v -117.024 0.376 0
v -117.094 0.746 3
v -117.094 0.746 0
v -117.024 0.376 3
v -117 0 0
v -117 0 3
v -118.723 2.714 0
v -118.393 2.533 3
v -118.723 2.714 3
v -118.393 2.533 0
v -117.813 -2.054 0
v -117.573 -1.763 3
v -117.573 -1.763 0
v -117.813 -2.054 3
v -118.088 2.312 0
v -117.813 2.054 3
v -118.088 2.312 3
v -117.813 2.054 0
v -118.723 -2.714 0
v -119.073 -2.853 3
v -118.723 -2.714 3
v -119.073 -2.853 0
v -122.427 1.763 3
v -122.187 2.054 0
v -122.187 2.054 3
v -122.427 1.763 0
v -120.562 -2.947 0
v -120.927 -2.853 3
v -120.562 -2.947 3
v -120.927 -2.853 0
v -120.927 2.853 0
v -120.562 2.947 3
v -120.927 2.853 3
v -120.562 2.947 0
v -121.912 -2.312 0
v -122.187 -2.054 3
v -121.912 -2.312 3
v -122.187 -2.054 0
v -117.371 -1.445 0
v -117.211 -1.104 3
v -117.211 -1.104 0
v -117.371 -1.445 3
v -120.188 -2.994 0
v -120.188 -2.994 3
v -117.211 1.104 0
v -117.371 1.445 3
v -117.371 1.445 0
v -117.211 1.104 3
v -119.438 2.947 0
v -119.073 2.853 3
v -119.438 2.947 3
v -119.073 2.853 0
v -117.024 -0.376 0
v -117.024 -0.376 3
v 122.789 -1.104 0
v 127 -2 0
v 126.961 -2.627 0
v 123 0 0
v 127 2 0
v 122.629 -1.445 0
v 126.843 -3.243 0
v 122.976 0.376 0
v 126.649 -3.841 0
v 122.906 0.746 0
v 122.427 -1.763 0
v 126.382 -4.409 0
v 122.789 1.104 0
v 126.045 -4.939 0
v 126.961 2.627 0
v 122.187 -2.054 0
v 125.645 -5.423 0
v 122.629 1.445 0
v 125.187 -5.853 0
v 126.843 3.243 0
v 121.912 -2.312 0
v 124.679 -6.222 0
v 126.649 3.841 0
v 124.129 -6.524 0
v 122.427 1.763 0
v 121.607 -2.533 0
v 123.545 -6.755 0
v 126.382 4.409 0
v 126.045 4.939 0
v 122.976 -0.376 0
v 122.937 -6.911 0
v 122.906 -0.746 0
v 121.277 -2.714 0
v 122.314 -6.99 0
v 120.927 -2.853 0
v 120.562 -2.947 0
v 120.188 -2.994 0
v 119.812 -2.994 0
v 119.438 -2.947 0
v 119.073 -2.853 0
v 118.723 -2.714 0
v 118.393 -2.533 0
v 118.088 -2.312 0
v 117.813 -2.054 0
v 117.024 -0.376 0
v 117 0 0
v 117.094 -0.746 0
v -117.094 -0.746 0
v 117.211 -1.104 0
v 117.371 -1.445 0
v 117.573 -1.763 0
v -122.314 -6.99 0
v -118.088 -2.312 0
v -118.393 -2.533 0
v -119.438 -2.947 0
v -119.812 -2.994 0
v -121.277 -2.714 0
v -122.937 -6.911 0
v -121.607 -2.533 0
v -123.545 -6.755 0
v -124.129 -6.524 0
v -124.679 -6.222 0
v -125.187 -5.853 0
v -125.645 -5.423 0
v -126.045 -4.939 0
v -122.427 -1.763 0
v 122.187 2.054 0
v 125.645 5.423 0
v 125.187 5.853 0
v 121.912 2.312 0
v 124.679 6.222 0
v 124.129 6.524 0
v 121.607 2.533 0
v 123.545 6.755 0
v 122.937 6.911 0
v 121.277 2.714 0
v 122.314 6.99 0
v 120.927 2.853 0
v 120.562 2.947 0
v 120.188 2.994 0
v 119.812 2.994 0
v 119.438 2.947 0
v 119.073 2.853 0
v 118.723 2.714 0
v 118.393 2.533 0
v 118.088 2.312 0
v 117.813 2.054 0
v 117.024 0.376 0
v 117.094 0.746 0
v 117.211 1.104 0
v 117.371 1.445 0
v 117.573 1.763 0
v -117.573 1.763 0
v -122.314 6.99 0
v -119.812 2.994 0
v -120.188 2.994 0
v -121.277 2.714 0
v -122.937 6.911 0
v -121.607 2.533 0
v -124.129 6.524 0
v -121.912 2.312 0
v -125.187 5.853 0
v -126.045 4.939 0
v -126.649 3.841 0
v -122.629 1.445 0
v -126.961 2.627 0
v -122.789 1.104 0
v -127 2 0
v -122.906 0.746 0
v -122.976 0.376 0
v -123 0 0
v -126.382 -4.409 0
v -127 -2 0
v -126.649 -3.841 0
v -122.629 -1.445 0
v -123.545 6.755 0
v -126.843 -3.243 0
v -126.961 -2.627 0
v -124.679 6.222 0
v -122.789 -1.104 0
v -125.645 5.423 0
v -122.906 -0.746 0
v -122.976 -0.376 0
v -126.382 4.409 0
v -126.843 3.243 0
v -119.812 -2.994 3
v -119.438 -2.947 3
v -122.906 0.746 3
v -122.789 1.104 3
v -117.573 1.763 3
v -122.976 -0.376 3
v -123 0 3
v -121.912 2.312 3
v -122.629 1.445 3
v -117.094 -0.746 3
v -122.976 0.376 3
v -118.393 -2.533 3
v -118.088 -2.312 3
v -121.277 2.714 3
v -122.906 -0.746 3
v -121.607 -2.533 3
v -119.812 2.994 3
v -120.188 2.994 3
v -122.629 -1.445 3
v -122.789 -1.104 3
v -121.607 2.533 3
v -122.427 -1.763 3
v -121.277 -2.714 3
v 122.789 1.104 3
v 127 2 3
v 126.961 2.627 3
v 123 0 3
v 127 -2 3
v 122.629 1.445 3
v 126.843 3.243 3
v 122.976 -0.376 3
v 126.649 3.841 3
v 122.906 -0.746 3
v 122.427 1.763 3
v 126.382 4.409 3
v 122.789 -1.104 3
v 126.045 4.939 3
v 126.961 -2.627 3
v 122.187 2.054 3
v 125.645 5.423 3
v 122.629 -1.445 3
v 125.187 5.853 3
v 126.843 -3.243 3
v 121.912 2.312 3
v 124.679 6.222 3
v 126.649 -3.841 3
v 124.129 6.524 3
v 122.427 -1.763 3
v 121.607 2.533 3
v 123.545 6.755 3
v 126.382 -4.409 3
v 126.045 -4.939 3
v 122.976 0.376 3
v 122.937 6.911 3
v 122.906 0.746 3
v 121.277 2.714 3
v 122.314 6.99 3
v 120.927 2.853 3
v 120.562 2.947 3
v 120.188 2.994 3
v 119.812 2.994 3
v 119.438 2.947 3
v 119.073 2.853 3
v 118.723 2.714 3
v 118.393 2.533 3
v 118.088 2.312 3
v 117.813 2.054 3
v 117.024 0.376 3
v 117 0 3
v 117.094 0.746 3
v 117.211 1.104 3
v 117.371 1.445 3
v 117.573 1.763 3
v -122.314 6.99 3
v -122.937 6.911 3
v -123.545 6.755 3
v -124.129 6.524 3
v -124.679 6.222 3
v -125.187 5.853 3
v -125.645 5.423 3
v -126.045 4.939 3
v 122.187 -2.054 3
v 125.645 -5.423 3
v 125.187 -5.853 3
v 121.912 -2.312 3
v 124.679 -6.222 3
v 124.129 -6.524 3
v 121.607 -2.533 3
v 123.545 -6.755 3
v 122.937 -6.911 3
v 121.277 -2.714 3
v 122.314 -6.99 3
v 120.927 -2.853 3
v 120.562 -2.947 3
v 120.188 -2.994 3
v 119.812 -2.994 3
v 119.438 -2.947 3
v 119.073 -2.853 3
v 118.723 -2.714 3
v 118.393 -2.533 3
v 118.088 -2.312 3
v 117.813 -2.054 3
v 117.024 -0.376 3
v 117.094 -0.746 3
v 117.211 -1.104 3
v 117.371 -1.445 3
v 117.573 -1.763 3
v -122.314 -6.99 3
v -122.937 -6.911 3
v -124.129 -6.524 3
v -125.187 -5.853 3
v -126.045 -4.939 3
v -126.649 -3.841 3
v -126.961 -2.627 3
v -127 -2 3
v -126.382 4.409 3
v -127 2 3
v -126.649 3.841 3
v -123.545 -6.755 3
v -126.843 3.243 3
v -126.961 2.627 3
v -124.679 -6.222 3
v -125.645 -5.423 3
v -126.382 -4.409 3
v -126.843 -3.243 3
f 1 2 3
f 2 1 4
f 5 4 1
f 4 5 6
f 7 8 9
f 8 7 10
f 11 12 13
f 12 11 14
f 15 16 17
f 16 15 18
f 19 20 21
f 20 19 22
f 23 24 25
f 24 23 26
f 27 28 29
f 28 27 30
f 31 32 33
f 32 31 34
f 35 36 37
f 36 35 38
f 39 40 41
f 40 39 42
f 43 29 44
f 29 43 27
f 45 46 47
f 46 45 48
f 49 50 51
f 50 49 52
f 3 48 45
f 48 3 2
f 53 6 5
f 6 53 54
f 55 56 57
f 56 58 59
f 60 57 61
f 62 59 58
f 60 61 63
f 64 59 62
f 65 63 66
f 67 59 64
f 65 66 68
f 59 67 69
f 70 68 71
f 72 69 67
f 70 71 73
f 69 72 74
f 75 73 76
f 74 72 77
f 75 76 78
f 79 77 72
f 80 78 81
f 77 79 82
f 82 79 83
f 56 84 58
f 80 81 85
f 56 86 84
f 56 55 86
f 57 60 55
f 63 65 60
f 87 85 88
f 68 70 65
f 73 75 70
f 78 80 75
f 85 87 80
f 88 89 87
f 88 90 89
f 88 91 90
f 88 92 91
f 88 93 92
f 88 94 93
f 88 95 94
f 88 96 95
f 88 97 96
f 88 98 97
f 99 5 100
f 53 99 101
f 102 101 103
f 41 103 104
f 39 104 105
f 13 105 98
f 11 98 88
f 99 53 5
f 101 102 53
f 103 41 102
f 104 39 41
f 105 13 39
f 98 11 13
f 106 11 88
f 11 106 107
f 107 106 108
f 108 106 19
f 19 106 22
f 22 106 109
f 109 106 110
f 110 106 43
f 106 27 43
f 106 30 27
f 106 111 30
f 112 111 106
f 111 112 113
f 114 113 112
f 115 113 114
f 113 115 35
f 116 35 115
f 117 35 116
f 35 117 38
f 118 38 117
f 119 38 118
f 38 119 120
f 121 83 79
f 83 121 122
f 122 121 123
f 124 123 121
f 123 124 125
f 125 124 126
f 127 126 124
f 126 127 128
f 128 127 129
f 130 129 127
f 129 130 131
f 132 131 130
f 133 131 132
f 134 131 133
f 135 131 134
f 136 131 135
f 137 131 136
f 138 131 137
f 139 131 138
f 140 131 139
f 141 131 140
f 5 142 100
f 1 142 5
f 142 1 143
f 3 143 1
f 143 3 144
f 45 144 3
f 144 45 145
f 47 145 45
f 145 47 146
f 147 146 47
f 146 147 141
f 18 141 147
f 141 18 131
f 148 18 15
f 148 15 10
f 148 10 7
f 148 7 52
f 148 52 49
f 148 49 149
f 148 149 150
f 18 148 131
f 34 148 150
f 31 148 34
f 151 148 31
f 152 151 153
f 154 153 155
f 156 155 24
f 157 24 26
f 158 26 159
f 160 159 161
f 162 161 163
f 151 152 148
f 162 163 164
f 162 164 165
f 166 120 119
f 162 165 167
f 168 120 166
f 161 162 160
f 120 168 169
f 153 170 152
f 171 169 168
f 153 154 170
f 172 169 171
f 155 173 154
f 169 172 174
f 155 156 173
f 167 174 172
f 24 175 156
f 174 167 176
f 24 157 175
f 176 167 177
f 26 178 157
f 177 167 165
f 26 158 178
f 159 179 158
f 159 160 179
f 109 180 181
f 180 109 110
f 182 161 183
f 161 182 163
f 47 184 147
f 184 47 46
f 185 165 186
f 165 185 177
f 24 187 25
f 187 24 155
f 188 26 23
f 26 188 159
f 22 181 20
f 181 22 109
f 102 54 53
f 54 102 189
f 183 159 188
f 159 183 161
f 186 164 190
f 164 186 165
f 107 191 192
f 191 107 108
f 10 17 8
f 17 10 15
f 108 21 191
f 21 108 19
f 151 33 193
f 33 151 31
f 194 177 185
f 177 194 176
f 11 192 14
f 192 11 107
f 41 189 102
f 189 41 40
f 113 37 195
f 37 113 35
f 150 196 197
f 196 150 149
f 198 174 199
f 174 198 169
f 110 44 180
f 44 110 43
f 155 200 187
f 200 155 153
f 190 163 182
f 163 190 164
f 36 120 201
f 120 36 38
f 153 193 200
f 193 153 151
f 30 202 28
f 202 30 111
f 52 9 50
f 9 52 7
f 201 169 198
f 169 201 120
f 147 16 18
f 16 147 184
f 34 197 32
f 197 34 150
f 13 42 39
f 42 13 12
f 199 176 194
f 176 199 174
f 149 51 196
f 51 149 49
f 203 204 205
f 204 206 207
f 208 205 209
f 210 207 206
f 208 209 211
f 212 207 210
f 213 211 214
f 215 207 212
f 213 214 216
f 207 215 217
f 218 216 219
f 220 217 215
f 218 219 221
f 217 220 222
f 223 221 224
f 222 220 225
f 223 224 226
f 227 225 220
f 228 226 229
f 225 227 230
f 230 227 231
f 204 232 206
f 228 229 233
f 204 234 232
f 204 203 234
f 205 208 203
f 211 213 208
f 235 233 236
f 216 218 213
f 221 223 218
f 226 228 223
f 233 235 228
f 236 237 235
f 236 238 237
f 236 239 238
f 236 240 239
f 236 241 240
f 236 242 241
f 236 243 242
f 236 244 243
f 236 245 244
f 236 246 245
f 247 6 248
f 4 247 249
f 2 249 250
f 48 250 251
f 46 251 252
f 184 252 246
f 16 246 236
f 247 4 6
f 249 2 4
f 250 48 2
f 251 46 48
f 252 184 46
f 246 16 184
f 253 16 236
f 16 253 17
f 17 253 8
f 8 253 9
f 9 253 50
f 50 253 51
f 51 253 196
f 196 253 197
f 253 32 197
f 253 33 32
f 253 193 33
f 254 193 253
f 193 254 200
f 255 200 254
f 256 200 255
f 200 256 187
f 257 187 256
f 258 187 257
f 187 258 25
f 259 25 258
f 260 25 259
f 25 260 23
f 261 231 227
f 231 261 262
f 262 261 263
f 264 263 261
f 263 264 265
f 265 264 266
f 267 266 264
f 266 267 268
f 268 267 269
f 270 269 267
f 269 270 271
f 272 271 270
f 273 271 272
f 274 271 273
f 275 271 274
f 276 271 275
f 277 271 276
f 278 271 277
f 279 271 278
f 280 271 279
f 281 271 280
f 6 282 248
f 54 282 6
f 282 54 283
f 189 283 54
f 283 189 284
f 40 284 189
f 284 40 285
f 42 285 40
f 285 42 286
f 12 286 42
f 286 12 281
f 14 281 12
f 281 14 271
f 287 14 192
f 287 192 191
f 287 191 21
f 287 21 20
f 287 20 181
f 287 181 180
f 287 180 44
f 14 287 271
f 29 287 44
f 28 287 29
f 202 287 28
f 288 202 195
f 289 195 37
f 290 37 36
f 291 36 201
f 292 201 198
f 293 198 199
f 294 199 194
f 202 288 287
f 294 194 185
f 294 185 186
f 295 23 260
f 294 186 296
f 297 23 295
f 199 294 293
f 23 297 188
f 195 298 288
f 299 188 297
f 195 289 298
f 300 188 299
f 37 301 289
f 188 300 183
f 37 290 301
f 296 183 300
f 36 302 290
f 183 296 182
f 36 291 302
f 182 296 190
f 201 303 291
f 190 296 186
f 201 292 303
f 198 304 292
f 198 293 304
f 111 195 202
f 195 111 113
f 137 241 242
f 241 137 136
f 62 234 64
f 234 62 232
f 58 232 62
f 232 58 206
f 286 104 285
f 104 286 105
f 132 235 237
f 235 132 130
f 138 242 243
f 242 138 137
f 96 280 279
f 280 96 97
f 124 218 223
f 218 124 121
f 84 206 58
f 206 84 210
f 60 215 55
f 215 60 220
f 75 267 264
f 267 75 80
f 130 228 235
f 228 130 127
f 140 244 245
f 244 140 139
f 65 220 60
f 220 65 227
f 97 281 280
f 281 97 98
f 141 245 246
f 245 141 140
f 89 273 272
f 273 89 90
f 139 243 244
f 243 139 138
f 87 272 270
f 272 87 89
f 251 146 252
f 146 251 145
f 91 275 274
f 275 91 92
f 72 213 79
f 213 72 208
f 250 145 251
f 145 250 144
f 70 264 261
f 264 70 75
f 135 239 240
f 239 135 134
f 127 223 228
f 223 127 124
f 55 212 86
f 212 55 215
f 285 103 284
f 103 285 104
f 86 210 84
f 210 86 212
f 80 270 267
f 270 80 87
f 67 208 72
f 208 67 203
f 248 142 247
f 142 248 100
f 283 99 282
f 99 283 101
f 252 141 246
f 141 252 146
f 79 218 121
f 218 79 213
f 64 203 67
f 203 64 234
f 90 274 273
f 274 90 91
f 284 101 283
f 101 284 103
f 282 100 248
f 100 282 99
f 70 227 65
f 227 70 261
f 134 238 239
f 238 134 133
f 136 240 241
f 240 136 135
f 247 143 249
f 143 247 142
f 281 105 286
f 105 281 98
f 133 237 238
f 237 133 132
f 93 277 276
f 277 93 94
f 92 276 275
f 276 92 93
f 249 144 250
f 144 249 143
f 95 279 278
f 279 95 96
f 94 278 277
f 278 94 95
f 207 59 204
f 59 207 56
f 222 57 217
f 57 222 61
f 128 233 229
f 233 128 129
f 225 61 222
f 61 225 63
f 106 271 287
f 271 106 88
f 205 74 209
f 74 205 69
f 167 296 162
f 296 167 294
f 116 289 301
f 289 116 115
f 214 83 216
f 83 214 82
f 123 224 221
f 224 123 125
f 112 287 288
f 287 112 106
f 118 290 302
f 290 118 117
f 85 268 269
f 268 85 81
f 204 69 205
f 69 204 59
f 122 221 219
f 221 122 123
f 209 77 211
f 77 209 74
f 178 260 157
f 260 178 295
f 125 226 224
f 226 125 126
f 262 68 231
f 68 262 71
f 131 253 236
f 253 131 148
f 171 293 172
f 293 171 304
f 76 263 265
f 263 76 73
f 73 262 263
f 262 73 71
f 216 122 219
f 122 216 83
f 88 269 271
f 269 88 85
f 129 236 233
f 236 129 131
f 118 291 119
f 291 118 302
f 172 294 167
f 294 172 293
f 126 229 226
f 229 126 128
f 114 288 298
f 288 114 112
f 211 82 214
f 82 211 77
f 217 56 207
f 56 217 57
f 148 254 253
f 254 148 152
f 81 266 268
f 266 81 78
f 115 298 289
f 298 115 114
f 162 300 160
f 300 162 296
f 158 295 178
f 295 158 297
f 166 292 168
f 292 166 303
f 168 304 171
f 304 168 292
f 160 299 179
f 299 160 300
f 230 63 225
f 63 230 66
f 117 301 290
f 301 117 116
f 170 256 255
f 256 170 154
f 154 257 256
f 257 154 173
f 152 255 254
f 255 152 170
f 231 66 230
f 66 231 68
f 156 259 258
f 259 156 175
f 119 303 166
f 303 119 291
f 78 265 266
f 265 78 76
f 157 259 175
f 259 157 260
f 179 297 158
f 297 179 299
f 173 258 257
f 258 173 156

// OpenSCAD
$fn = 50;


difference() {
	union() {
		hull() {
			translate(v = [-122.0000000000, 2.0000000000, 0]) {
				cylinder(h = 3, r = 5);
			}
			translate(v = [122.0000000000, 2.0000000000, 0]) {
				cylinder(h = 3, r = 5);
			}
			translate(v = [-122.0000000000, -2.0000000000, 0]) {
				cylinder(h = 3, r = 5);
			}
			translate(v = [122.0000000000, -2.0000000000, 0]) {
				cylinder(h = 3, r = 5);
			}
		}
	}
	union() {
		translate(v = [-120.0000000000, 0.0000000000, 0]) {
			cylinder(h = 3, r = 3.0000000000);
		}
		translate(v = [120.0000000000, 0.0000000000, 0]) {
			cylinder(h = 3, r = 3.0000000000);
		}
		translate(v = [-120.0000000000, 0.0000000000, 0]) {
			cylinder(h = 3, r = 1.5000000000);
		}
		translate(v = [120.0000000000, 0.0000000000, 0]) {
			cylinder(h = 3, r = 1.5000000000);
		}
		translate(v = [-120.0000000000, 0.0000000000, 0]) {
			cylinder(h = 3, r = 1.5000000000);
		}
		translate(v = [120.0000000000, 0.0000000000, 0]) {
			cylinder(h = 3, r = 1.5000000000);
		}
		translate(v = [-120.0000000000, 0.0000000000, 0]) {
			cylinder(h = 3, r = 1.5000000000);
		}
		translate(v = [120.0000000000, 0.0000000000, 0]) {
			cylinder(h = 3, r = 1.5000000000);
		}
	}
}
